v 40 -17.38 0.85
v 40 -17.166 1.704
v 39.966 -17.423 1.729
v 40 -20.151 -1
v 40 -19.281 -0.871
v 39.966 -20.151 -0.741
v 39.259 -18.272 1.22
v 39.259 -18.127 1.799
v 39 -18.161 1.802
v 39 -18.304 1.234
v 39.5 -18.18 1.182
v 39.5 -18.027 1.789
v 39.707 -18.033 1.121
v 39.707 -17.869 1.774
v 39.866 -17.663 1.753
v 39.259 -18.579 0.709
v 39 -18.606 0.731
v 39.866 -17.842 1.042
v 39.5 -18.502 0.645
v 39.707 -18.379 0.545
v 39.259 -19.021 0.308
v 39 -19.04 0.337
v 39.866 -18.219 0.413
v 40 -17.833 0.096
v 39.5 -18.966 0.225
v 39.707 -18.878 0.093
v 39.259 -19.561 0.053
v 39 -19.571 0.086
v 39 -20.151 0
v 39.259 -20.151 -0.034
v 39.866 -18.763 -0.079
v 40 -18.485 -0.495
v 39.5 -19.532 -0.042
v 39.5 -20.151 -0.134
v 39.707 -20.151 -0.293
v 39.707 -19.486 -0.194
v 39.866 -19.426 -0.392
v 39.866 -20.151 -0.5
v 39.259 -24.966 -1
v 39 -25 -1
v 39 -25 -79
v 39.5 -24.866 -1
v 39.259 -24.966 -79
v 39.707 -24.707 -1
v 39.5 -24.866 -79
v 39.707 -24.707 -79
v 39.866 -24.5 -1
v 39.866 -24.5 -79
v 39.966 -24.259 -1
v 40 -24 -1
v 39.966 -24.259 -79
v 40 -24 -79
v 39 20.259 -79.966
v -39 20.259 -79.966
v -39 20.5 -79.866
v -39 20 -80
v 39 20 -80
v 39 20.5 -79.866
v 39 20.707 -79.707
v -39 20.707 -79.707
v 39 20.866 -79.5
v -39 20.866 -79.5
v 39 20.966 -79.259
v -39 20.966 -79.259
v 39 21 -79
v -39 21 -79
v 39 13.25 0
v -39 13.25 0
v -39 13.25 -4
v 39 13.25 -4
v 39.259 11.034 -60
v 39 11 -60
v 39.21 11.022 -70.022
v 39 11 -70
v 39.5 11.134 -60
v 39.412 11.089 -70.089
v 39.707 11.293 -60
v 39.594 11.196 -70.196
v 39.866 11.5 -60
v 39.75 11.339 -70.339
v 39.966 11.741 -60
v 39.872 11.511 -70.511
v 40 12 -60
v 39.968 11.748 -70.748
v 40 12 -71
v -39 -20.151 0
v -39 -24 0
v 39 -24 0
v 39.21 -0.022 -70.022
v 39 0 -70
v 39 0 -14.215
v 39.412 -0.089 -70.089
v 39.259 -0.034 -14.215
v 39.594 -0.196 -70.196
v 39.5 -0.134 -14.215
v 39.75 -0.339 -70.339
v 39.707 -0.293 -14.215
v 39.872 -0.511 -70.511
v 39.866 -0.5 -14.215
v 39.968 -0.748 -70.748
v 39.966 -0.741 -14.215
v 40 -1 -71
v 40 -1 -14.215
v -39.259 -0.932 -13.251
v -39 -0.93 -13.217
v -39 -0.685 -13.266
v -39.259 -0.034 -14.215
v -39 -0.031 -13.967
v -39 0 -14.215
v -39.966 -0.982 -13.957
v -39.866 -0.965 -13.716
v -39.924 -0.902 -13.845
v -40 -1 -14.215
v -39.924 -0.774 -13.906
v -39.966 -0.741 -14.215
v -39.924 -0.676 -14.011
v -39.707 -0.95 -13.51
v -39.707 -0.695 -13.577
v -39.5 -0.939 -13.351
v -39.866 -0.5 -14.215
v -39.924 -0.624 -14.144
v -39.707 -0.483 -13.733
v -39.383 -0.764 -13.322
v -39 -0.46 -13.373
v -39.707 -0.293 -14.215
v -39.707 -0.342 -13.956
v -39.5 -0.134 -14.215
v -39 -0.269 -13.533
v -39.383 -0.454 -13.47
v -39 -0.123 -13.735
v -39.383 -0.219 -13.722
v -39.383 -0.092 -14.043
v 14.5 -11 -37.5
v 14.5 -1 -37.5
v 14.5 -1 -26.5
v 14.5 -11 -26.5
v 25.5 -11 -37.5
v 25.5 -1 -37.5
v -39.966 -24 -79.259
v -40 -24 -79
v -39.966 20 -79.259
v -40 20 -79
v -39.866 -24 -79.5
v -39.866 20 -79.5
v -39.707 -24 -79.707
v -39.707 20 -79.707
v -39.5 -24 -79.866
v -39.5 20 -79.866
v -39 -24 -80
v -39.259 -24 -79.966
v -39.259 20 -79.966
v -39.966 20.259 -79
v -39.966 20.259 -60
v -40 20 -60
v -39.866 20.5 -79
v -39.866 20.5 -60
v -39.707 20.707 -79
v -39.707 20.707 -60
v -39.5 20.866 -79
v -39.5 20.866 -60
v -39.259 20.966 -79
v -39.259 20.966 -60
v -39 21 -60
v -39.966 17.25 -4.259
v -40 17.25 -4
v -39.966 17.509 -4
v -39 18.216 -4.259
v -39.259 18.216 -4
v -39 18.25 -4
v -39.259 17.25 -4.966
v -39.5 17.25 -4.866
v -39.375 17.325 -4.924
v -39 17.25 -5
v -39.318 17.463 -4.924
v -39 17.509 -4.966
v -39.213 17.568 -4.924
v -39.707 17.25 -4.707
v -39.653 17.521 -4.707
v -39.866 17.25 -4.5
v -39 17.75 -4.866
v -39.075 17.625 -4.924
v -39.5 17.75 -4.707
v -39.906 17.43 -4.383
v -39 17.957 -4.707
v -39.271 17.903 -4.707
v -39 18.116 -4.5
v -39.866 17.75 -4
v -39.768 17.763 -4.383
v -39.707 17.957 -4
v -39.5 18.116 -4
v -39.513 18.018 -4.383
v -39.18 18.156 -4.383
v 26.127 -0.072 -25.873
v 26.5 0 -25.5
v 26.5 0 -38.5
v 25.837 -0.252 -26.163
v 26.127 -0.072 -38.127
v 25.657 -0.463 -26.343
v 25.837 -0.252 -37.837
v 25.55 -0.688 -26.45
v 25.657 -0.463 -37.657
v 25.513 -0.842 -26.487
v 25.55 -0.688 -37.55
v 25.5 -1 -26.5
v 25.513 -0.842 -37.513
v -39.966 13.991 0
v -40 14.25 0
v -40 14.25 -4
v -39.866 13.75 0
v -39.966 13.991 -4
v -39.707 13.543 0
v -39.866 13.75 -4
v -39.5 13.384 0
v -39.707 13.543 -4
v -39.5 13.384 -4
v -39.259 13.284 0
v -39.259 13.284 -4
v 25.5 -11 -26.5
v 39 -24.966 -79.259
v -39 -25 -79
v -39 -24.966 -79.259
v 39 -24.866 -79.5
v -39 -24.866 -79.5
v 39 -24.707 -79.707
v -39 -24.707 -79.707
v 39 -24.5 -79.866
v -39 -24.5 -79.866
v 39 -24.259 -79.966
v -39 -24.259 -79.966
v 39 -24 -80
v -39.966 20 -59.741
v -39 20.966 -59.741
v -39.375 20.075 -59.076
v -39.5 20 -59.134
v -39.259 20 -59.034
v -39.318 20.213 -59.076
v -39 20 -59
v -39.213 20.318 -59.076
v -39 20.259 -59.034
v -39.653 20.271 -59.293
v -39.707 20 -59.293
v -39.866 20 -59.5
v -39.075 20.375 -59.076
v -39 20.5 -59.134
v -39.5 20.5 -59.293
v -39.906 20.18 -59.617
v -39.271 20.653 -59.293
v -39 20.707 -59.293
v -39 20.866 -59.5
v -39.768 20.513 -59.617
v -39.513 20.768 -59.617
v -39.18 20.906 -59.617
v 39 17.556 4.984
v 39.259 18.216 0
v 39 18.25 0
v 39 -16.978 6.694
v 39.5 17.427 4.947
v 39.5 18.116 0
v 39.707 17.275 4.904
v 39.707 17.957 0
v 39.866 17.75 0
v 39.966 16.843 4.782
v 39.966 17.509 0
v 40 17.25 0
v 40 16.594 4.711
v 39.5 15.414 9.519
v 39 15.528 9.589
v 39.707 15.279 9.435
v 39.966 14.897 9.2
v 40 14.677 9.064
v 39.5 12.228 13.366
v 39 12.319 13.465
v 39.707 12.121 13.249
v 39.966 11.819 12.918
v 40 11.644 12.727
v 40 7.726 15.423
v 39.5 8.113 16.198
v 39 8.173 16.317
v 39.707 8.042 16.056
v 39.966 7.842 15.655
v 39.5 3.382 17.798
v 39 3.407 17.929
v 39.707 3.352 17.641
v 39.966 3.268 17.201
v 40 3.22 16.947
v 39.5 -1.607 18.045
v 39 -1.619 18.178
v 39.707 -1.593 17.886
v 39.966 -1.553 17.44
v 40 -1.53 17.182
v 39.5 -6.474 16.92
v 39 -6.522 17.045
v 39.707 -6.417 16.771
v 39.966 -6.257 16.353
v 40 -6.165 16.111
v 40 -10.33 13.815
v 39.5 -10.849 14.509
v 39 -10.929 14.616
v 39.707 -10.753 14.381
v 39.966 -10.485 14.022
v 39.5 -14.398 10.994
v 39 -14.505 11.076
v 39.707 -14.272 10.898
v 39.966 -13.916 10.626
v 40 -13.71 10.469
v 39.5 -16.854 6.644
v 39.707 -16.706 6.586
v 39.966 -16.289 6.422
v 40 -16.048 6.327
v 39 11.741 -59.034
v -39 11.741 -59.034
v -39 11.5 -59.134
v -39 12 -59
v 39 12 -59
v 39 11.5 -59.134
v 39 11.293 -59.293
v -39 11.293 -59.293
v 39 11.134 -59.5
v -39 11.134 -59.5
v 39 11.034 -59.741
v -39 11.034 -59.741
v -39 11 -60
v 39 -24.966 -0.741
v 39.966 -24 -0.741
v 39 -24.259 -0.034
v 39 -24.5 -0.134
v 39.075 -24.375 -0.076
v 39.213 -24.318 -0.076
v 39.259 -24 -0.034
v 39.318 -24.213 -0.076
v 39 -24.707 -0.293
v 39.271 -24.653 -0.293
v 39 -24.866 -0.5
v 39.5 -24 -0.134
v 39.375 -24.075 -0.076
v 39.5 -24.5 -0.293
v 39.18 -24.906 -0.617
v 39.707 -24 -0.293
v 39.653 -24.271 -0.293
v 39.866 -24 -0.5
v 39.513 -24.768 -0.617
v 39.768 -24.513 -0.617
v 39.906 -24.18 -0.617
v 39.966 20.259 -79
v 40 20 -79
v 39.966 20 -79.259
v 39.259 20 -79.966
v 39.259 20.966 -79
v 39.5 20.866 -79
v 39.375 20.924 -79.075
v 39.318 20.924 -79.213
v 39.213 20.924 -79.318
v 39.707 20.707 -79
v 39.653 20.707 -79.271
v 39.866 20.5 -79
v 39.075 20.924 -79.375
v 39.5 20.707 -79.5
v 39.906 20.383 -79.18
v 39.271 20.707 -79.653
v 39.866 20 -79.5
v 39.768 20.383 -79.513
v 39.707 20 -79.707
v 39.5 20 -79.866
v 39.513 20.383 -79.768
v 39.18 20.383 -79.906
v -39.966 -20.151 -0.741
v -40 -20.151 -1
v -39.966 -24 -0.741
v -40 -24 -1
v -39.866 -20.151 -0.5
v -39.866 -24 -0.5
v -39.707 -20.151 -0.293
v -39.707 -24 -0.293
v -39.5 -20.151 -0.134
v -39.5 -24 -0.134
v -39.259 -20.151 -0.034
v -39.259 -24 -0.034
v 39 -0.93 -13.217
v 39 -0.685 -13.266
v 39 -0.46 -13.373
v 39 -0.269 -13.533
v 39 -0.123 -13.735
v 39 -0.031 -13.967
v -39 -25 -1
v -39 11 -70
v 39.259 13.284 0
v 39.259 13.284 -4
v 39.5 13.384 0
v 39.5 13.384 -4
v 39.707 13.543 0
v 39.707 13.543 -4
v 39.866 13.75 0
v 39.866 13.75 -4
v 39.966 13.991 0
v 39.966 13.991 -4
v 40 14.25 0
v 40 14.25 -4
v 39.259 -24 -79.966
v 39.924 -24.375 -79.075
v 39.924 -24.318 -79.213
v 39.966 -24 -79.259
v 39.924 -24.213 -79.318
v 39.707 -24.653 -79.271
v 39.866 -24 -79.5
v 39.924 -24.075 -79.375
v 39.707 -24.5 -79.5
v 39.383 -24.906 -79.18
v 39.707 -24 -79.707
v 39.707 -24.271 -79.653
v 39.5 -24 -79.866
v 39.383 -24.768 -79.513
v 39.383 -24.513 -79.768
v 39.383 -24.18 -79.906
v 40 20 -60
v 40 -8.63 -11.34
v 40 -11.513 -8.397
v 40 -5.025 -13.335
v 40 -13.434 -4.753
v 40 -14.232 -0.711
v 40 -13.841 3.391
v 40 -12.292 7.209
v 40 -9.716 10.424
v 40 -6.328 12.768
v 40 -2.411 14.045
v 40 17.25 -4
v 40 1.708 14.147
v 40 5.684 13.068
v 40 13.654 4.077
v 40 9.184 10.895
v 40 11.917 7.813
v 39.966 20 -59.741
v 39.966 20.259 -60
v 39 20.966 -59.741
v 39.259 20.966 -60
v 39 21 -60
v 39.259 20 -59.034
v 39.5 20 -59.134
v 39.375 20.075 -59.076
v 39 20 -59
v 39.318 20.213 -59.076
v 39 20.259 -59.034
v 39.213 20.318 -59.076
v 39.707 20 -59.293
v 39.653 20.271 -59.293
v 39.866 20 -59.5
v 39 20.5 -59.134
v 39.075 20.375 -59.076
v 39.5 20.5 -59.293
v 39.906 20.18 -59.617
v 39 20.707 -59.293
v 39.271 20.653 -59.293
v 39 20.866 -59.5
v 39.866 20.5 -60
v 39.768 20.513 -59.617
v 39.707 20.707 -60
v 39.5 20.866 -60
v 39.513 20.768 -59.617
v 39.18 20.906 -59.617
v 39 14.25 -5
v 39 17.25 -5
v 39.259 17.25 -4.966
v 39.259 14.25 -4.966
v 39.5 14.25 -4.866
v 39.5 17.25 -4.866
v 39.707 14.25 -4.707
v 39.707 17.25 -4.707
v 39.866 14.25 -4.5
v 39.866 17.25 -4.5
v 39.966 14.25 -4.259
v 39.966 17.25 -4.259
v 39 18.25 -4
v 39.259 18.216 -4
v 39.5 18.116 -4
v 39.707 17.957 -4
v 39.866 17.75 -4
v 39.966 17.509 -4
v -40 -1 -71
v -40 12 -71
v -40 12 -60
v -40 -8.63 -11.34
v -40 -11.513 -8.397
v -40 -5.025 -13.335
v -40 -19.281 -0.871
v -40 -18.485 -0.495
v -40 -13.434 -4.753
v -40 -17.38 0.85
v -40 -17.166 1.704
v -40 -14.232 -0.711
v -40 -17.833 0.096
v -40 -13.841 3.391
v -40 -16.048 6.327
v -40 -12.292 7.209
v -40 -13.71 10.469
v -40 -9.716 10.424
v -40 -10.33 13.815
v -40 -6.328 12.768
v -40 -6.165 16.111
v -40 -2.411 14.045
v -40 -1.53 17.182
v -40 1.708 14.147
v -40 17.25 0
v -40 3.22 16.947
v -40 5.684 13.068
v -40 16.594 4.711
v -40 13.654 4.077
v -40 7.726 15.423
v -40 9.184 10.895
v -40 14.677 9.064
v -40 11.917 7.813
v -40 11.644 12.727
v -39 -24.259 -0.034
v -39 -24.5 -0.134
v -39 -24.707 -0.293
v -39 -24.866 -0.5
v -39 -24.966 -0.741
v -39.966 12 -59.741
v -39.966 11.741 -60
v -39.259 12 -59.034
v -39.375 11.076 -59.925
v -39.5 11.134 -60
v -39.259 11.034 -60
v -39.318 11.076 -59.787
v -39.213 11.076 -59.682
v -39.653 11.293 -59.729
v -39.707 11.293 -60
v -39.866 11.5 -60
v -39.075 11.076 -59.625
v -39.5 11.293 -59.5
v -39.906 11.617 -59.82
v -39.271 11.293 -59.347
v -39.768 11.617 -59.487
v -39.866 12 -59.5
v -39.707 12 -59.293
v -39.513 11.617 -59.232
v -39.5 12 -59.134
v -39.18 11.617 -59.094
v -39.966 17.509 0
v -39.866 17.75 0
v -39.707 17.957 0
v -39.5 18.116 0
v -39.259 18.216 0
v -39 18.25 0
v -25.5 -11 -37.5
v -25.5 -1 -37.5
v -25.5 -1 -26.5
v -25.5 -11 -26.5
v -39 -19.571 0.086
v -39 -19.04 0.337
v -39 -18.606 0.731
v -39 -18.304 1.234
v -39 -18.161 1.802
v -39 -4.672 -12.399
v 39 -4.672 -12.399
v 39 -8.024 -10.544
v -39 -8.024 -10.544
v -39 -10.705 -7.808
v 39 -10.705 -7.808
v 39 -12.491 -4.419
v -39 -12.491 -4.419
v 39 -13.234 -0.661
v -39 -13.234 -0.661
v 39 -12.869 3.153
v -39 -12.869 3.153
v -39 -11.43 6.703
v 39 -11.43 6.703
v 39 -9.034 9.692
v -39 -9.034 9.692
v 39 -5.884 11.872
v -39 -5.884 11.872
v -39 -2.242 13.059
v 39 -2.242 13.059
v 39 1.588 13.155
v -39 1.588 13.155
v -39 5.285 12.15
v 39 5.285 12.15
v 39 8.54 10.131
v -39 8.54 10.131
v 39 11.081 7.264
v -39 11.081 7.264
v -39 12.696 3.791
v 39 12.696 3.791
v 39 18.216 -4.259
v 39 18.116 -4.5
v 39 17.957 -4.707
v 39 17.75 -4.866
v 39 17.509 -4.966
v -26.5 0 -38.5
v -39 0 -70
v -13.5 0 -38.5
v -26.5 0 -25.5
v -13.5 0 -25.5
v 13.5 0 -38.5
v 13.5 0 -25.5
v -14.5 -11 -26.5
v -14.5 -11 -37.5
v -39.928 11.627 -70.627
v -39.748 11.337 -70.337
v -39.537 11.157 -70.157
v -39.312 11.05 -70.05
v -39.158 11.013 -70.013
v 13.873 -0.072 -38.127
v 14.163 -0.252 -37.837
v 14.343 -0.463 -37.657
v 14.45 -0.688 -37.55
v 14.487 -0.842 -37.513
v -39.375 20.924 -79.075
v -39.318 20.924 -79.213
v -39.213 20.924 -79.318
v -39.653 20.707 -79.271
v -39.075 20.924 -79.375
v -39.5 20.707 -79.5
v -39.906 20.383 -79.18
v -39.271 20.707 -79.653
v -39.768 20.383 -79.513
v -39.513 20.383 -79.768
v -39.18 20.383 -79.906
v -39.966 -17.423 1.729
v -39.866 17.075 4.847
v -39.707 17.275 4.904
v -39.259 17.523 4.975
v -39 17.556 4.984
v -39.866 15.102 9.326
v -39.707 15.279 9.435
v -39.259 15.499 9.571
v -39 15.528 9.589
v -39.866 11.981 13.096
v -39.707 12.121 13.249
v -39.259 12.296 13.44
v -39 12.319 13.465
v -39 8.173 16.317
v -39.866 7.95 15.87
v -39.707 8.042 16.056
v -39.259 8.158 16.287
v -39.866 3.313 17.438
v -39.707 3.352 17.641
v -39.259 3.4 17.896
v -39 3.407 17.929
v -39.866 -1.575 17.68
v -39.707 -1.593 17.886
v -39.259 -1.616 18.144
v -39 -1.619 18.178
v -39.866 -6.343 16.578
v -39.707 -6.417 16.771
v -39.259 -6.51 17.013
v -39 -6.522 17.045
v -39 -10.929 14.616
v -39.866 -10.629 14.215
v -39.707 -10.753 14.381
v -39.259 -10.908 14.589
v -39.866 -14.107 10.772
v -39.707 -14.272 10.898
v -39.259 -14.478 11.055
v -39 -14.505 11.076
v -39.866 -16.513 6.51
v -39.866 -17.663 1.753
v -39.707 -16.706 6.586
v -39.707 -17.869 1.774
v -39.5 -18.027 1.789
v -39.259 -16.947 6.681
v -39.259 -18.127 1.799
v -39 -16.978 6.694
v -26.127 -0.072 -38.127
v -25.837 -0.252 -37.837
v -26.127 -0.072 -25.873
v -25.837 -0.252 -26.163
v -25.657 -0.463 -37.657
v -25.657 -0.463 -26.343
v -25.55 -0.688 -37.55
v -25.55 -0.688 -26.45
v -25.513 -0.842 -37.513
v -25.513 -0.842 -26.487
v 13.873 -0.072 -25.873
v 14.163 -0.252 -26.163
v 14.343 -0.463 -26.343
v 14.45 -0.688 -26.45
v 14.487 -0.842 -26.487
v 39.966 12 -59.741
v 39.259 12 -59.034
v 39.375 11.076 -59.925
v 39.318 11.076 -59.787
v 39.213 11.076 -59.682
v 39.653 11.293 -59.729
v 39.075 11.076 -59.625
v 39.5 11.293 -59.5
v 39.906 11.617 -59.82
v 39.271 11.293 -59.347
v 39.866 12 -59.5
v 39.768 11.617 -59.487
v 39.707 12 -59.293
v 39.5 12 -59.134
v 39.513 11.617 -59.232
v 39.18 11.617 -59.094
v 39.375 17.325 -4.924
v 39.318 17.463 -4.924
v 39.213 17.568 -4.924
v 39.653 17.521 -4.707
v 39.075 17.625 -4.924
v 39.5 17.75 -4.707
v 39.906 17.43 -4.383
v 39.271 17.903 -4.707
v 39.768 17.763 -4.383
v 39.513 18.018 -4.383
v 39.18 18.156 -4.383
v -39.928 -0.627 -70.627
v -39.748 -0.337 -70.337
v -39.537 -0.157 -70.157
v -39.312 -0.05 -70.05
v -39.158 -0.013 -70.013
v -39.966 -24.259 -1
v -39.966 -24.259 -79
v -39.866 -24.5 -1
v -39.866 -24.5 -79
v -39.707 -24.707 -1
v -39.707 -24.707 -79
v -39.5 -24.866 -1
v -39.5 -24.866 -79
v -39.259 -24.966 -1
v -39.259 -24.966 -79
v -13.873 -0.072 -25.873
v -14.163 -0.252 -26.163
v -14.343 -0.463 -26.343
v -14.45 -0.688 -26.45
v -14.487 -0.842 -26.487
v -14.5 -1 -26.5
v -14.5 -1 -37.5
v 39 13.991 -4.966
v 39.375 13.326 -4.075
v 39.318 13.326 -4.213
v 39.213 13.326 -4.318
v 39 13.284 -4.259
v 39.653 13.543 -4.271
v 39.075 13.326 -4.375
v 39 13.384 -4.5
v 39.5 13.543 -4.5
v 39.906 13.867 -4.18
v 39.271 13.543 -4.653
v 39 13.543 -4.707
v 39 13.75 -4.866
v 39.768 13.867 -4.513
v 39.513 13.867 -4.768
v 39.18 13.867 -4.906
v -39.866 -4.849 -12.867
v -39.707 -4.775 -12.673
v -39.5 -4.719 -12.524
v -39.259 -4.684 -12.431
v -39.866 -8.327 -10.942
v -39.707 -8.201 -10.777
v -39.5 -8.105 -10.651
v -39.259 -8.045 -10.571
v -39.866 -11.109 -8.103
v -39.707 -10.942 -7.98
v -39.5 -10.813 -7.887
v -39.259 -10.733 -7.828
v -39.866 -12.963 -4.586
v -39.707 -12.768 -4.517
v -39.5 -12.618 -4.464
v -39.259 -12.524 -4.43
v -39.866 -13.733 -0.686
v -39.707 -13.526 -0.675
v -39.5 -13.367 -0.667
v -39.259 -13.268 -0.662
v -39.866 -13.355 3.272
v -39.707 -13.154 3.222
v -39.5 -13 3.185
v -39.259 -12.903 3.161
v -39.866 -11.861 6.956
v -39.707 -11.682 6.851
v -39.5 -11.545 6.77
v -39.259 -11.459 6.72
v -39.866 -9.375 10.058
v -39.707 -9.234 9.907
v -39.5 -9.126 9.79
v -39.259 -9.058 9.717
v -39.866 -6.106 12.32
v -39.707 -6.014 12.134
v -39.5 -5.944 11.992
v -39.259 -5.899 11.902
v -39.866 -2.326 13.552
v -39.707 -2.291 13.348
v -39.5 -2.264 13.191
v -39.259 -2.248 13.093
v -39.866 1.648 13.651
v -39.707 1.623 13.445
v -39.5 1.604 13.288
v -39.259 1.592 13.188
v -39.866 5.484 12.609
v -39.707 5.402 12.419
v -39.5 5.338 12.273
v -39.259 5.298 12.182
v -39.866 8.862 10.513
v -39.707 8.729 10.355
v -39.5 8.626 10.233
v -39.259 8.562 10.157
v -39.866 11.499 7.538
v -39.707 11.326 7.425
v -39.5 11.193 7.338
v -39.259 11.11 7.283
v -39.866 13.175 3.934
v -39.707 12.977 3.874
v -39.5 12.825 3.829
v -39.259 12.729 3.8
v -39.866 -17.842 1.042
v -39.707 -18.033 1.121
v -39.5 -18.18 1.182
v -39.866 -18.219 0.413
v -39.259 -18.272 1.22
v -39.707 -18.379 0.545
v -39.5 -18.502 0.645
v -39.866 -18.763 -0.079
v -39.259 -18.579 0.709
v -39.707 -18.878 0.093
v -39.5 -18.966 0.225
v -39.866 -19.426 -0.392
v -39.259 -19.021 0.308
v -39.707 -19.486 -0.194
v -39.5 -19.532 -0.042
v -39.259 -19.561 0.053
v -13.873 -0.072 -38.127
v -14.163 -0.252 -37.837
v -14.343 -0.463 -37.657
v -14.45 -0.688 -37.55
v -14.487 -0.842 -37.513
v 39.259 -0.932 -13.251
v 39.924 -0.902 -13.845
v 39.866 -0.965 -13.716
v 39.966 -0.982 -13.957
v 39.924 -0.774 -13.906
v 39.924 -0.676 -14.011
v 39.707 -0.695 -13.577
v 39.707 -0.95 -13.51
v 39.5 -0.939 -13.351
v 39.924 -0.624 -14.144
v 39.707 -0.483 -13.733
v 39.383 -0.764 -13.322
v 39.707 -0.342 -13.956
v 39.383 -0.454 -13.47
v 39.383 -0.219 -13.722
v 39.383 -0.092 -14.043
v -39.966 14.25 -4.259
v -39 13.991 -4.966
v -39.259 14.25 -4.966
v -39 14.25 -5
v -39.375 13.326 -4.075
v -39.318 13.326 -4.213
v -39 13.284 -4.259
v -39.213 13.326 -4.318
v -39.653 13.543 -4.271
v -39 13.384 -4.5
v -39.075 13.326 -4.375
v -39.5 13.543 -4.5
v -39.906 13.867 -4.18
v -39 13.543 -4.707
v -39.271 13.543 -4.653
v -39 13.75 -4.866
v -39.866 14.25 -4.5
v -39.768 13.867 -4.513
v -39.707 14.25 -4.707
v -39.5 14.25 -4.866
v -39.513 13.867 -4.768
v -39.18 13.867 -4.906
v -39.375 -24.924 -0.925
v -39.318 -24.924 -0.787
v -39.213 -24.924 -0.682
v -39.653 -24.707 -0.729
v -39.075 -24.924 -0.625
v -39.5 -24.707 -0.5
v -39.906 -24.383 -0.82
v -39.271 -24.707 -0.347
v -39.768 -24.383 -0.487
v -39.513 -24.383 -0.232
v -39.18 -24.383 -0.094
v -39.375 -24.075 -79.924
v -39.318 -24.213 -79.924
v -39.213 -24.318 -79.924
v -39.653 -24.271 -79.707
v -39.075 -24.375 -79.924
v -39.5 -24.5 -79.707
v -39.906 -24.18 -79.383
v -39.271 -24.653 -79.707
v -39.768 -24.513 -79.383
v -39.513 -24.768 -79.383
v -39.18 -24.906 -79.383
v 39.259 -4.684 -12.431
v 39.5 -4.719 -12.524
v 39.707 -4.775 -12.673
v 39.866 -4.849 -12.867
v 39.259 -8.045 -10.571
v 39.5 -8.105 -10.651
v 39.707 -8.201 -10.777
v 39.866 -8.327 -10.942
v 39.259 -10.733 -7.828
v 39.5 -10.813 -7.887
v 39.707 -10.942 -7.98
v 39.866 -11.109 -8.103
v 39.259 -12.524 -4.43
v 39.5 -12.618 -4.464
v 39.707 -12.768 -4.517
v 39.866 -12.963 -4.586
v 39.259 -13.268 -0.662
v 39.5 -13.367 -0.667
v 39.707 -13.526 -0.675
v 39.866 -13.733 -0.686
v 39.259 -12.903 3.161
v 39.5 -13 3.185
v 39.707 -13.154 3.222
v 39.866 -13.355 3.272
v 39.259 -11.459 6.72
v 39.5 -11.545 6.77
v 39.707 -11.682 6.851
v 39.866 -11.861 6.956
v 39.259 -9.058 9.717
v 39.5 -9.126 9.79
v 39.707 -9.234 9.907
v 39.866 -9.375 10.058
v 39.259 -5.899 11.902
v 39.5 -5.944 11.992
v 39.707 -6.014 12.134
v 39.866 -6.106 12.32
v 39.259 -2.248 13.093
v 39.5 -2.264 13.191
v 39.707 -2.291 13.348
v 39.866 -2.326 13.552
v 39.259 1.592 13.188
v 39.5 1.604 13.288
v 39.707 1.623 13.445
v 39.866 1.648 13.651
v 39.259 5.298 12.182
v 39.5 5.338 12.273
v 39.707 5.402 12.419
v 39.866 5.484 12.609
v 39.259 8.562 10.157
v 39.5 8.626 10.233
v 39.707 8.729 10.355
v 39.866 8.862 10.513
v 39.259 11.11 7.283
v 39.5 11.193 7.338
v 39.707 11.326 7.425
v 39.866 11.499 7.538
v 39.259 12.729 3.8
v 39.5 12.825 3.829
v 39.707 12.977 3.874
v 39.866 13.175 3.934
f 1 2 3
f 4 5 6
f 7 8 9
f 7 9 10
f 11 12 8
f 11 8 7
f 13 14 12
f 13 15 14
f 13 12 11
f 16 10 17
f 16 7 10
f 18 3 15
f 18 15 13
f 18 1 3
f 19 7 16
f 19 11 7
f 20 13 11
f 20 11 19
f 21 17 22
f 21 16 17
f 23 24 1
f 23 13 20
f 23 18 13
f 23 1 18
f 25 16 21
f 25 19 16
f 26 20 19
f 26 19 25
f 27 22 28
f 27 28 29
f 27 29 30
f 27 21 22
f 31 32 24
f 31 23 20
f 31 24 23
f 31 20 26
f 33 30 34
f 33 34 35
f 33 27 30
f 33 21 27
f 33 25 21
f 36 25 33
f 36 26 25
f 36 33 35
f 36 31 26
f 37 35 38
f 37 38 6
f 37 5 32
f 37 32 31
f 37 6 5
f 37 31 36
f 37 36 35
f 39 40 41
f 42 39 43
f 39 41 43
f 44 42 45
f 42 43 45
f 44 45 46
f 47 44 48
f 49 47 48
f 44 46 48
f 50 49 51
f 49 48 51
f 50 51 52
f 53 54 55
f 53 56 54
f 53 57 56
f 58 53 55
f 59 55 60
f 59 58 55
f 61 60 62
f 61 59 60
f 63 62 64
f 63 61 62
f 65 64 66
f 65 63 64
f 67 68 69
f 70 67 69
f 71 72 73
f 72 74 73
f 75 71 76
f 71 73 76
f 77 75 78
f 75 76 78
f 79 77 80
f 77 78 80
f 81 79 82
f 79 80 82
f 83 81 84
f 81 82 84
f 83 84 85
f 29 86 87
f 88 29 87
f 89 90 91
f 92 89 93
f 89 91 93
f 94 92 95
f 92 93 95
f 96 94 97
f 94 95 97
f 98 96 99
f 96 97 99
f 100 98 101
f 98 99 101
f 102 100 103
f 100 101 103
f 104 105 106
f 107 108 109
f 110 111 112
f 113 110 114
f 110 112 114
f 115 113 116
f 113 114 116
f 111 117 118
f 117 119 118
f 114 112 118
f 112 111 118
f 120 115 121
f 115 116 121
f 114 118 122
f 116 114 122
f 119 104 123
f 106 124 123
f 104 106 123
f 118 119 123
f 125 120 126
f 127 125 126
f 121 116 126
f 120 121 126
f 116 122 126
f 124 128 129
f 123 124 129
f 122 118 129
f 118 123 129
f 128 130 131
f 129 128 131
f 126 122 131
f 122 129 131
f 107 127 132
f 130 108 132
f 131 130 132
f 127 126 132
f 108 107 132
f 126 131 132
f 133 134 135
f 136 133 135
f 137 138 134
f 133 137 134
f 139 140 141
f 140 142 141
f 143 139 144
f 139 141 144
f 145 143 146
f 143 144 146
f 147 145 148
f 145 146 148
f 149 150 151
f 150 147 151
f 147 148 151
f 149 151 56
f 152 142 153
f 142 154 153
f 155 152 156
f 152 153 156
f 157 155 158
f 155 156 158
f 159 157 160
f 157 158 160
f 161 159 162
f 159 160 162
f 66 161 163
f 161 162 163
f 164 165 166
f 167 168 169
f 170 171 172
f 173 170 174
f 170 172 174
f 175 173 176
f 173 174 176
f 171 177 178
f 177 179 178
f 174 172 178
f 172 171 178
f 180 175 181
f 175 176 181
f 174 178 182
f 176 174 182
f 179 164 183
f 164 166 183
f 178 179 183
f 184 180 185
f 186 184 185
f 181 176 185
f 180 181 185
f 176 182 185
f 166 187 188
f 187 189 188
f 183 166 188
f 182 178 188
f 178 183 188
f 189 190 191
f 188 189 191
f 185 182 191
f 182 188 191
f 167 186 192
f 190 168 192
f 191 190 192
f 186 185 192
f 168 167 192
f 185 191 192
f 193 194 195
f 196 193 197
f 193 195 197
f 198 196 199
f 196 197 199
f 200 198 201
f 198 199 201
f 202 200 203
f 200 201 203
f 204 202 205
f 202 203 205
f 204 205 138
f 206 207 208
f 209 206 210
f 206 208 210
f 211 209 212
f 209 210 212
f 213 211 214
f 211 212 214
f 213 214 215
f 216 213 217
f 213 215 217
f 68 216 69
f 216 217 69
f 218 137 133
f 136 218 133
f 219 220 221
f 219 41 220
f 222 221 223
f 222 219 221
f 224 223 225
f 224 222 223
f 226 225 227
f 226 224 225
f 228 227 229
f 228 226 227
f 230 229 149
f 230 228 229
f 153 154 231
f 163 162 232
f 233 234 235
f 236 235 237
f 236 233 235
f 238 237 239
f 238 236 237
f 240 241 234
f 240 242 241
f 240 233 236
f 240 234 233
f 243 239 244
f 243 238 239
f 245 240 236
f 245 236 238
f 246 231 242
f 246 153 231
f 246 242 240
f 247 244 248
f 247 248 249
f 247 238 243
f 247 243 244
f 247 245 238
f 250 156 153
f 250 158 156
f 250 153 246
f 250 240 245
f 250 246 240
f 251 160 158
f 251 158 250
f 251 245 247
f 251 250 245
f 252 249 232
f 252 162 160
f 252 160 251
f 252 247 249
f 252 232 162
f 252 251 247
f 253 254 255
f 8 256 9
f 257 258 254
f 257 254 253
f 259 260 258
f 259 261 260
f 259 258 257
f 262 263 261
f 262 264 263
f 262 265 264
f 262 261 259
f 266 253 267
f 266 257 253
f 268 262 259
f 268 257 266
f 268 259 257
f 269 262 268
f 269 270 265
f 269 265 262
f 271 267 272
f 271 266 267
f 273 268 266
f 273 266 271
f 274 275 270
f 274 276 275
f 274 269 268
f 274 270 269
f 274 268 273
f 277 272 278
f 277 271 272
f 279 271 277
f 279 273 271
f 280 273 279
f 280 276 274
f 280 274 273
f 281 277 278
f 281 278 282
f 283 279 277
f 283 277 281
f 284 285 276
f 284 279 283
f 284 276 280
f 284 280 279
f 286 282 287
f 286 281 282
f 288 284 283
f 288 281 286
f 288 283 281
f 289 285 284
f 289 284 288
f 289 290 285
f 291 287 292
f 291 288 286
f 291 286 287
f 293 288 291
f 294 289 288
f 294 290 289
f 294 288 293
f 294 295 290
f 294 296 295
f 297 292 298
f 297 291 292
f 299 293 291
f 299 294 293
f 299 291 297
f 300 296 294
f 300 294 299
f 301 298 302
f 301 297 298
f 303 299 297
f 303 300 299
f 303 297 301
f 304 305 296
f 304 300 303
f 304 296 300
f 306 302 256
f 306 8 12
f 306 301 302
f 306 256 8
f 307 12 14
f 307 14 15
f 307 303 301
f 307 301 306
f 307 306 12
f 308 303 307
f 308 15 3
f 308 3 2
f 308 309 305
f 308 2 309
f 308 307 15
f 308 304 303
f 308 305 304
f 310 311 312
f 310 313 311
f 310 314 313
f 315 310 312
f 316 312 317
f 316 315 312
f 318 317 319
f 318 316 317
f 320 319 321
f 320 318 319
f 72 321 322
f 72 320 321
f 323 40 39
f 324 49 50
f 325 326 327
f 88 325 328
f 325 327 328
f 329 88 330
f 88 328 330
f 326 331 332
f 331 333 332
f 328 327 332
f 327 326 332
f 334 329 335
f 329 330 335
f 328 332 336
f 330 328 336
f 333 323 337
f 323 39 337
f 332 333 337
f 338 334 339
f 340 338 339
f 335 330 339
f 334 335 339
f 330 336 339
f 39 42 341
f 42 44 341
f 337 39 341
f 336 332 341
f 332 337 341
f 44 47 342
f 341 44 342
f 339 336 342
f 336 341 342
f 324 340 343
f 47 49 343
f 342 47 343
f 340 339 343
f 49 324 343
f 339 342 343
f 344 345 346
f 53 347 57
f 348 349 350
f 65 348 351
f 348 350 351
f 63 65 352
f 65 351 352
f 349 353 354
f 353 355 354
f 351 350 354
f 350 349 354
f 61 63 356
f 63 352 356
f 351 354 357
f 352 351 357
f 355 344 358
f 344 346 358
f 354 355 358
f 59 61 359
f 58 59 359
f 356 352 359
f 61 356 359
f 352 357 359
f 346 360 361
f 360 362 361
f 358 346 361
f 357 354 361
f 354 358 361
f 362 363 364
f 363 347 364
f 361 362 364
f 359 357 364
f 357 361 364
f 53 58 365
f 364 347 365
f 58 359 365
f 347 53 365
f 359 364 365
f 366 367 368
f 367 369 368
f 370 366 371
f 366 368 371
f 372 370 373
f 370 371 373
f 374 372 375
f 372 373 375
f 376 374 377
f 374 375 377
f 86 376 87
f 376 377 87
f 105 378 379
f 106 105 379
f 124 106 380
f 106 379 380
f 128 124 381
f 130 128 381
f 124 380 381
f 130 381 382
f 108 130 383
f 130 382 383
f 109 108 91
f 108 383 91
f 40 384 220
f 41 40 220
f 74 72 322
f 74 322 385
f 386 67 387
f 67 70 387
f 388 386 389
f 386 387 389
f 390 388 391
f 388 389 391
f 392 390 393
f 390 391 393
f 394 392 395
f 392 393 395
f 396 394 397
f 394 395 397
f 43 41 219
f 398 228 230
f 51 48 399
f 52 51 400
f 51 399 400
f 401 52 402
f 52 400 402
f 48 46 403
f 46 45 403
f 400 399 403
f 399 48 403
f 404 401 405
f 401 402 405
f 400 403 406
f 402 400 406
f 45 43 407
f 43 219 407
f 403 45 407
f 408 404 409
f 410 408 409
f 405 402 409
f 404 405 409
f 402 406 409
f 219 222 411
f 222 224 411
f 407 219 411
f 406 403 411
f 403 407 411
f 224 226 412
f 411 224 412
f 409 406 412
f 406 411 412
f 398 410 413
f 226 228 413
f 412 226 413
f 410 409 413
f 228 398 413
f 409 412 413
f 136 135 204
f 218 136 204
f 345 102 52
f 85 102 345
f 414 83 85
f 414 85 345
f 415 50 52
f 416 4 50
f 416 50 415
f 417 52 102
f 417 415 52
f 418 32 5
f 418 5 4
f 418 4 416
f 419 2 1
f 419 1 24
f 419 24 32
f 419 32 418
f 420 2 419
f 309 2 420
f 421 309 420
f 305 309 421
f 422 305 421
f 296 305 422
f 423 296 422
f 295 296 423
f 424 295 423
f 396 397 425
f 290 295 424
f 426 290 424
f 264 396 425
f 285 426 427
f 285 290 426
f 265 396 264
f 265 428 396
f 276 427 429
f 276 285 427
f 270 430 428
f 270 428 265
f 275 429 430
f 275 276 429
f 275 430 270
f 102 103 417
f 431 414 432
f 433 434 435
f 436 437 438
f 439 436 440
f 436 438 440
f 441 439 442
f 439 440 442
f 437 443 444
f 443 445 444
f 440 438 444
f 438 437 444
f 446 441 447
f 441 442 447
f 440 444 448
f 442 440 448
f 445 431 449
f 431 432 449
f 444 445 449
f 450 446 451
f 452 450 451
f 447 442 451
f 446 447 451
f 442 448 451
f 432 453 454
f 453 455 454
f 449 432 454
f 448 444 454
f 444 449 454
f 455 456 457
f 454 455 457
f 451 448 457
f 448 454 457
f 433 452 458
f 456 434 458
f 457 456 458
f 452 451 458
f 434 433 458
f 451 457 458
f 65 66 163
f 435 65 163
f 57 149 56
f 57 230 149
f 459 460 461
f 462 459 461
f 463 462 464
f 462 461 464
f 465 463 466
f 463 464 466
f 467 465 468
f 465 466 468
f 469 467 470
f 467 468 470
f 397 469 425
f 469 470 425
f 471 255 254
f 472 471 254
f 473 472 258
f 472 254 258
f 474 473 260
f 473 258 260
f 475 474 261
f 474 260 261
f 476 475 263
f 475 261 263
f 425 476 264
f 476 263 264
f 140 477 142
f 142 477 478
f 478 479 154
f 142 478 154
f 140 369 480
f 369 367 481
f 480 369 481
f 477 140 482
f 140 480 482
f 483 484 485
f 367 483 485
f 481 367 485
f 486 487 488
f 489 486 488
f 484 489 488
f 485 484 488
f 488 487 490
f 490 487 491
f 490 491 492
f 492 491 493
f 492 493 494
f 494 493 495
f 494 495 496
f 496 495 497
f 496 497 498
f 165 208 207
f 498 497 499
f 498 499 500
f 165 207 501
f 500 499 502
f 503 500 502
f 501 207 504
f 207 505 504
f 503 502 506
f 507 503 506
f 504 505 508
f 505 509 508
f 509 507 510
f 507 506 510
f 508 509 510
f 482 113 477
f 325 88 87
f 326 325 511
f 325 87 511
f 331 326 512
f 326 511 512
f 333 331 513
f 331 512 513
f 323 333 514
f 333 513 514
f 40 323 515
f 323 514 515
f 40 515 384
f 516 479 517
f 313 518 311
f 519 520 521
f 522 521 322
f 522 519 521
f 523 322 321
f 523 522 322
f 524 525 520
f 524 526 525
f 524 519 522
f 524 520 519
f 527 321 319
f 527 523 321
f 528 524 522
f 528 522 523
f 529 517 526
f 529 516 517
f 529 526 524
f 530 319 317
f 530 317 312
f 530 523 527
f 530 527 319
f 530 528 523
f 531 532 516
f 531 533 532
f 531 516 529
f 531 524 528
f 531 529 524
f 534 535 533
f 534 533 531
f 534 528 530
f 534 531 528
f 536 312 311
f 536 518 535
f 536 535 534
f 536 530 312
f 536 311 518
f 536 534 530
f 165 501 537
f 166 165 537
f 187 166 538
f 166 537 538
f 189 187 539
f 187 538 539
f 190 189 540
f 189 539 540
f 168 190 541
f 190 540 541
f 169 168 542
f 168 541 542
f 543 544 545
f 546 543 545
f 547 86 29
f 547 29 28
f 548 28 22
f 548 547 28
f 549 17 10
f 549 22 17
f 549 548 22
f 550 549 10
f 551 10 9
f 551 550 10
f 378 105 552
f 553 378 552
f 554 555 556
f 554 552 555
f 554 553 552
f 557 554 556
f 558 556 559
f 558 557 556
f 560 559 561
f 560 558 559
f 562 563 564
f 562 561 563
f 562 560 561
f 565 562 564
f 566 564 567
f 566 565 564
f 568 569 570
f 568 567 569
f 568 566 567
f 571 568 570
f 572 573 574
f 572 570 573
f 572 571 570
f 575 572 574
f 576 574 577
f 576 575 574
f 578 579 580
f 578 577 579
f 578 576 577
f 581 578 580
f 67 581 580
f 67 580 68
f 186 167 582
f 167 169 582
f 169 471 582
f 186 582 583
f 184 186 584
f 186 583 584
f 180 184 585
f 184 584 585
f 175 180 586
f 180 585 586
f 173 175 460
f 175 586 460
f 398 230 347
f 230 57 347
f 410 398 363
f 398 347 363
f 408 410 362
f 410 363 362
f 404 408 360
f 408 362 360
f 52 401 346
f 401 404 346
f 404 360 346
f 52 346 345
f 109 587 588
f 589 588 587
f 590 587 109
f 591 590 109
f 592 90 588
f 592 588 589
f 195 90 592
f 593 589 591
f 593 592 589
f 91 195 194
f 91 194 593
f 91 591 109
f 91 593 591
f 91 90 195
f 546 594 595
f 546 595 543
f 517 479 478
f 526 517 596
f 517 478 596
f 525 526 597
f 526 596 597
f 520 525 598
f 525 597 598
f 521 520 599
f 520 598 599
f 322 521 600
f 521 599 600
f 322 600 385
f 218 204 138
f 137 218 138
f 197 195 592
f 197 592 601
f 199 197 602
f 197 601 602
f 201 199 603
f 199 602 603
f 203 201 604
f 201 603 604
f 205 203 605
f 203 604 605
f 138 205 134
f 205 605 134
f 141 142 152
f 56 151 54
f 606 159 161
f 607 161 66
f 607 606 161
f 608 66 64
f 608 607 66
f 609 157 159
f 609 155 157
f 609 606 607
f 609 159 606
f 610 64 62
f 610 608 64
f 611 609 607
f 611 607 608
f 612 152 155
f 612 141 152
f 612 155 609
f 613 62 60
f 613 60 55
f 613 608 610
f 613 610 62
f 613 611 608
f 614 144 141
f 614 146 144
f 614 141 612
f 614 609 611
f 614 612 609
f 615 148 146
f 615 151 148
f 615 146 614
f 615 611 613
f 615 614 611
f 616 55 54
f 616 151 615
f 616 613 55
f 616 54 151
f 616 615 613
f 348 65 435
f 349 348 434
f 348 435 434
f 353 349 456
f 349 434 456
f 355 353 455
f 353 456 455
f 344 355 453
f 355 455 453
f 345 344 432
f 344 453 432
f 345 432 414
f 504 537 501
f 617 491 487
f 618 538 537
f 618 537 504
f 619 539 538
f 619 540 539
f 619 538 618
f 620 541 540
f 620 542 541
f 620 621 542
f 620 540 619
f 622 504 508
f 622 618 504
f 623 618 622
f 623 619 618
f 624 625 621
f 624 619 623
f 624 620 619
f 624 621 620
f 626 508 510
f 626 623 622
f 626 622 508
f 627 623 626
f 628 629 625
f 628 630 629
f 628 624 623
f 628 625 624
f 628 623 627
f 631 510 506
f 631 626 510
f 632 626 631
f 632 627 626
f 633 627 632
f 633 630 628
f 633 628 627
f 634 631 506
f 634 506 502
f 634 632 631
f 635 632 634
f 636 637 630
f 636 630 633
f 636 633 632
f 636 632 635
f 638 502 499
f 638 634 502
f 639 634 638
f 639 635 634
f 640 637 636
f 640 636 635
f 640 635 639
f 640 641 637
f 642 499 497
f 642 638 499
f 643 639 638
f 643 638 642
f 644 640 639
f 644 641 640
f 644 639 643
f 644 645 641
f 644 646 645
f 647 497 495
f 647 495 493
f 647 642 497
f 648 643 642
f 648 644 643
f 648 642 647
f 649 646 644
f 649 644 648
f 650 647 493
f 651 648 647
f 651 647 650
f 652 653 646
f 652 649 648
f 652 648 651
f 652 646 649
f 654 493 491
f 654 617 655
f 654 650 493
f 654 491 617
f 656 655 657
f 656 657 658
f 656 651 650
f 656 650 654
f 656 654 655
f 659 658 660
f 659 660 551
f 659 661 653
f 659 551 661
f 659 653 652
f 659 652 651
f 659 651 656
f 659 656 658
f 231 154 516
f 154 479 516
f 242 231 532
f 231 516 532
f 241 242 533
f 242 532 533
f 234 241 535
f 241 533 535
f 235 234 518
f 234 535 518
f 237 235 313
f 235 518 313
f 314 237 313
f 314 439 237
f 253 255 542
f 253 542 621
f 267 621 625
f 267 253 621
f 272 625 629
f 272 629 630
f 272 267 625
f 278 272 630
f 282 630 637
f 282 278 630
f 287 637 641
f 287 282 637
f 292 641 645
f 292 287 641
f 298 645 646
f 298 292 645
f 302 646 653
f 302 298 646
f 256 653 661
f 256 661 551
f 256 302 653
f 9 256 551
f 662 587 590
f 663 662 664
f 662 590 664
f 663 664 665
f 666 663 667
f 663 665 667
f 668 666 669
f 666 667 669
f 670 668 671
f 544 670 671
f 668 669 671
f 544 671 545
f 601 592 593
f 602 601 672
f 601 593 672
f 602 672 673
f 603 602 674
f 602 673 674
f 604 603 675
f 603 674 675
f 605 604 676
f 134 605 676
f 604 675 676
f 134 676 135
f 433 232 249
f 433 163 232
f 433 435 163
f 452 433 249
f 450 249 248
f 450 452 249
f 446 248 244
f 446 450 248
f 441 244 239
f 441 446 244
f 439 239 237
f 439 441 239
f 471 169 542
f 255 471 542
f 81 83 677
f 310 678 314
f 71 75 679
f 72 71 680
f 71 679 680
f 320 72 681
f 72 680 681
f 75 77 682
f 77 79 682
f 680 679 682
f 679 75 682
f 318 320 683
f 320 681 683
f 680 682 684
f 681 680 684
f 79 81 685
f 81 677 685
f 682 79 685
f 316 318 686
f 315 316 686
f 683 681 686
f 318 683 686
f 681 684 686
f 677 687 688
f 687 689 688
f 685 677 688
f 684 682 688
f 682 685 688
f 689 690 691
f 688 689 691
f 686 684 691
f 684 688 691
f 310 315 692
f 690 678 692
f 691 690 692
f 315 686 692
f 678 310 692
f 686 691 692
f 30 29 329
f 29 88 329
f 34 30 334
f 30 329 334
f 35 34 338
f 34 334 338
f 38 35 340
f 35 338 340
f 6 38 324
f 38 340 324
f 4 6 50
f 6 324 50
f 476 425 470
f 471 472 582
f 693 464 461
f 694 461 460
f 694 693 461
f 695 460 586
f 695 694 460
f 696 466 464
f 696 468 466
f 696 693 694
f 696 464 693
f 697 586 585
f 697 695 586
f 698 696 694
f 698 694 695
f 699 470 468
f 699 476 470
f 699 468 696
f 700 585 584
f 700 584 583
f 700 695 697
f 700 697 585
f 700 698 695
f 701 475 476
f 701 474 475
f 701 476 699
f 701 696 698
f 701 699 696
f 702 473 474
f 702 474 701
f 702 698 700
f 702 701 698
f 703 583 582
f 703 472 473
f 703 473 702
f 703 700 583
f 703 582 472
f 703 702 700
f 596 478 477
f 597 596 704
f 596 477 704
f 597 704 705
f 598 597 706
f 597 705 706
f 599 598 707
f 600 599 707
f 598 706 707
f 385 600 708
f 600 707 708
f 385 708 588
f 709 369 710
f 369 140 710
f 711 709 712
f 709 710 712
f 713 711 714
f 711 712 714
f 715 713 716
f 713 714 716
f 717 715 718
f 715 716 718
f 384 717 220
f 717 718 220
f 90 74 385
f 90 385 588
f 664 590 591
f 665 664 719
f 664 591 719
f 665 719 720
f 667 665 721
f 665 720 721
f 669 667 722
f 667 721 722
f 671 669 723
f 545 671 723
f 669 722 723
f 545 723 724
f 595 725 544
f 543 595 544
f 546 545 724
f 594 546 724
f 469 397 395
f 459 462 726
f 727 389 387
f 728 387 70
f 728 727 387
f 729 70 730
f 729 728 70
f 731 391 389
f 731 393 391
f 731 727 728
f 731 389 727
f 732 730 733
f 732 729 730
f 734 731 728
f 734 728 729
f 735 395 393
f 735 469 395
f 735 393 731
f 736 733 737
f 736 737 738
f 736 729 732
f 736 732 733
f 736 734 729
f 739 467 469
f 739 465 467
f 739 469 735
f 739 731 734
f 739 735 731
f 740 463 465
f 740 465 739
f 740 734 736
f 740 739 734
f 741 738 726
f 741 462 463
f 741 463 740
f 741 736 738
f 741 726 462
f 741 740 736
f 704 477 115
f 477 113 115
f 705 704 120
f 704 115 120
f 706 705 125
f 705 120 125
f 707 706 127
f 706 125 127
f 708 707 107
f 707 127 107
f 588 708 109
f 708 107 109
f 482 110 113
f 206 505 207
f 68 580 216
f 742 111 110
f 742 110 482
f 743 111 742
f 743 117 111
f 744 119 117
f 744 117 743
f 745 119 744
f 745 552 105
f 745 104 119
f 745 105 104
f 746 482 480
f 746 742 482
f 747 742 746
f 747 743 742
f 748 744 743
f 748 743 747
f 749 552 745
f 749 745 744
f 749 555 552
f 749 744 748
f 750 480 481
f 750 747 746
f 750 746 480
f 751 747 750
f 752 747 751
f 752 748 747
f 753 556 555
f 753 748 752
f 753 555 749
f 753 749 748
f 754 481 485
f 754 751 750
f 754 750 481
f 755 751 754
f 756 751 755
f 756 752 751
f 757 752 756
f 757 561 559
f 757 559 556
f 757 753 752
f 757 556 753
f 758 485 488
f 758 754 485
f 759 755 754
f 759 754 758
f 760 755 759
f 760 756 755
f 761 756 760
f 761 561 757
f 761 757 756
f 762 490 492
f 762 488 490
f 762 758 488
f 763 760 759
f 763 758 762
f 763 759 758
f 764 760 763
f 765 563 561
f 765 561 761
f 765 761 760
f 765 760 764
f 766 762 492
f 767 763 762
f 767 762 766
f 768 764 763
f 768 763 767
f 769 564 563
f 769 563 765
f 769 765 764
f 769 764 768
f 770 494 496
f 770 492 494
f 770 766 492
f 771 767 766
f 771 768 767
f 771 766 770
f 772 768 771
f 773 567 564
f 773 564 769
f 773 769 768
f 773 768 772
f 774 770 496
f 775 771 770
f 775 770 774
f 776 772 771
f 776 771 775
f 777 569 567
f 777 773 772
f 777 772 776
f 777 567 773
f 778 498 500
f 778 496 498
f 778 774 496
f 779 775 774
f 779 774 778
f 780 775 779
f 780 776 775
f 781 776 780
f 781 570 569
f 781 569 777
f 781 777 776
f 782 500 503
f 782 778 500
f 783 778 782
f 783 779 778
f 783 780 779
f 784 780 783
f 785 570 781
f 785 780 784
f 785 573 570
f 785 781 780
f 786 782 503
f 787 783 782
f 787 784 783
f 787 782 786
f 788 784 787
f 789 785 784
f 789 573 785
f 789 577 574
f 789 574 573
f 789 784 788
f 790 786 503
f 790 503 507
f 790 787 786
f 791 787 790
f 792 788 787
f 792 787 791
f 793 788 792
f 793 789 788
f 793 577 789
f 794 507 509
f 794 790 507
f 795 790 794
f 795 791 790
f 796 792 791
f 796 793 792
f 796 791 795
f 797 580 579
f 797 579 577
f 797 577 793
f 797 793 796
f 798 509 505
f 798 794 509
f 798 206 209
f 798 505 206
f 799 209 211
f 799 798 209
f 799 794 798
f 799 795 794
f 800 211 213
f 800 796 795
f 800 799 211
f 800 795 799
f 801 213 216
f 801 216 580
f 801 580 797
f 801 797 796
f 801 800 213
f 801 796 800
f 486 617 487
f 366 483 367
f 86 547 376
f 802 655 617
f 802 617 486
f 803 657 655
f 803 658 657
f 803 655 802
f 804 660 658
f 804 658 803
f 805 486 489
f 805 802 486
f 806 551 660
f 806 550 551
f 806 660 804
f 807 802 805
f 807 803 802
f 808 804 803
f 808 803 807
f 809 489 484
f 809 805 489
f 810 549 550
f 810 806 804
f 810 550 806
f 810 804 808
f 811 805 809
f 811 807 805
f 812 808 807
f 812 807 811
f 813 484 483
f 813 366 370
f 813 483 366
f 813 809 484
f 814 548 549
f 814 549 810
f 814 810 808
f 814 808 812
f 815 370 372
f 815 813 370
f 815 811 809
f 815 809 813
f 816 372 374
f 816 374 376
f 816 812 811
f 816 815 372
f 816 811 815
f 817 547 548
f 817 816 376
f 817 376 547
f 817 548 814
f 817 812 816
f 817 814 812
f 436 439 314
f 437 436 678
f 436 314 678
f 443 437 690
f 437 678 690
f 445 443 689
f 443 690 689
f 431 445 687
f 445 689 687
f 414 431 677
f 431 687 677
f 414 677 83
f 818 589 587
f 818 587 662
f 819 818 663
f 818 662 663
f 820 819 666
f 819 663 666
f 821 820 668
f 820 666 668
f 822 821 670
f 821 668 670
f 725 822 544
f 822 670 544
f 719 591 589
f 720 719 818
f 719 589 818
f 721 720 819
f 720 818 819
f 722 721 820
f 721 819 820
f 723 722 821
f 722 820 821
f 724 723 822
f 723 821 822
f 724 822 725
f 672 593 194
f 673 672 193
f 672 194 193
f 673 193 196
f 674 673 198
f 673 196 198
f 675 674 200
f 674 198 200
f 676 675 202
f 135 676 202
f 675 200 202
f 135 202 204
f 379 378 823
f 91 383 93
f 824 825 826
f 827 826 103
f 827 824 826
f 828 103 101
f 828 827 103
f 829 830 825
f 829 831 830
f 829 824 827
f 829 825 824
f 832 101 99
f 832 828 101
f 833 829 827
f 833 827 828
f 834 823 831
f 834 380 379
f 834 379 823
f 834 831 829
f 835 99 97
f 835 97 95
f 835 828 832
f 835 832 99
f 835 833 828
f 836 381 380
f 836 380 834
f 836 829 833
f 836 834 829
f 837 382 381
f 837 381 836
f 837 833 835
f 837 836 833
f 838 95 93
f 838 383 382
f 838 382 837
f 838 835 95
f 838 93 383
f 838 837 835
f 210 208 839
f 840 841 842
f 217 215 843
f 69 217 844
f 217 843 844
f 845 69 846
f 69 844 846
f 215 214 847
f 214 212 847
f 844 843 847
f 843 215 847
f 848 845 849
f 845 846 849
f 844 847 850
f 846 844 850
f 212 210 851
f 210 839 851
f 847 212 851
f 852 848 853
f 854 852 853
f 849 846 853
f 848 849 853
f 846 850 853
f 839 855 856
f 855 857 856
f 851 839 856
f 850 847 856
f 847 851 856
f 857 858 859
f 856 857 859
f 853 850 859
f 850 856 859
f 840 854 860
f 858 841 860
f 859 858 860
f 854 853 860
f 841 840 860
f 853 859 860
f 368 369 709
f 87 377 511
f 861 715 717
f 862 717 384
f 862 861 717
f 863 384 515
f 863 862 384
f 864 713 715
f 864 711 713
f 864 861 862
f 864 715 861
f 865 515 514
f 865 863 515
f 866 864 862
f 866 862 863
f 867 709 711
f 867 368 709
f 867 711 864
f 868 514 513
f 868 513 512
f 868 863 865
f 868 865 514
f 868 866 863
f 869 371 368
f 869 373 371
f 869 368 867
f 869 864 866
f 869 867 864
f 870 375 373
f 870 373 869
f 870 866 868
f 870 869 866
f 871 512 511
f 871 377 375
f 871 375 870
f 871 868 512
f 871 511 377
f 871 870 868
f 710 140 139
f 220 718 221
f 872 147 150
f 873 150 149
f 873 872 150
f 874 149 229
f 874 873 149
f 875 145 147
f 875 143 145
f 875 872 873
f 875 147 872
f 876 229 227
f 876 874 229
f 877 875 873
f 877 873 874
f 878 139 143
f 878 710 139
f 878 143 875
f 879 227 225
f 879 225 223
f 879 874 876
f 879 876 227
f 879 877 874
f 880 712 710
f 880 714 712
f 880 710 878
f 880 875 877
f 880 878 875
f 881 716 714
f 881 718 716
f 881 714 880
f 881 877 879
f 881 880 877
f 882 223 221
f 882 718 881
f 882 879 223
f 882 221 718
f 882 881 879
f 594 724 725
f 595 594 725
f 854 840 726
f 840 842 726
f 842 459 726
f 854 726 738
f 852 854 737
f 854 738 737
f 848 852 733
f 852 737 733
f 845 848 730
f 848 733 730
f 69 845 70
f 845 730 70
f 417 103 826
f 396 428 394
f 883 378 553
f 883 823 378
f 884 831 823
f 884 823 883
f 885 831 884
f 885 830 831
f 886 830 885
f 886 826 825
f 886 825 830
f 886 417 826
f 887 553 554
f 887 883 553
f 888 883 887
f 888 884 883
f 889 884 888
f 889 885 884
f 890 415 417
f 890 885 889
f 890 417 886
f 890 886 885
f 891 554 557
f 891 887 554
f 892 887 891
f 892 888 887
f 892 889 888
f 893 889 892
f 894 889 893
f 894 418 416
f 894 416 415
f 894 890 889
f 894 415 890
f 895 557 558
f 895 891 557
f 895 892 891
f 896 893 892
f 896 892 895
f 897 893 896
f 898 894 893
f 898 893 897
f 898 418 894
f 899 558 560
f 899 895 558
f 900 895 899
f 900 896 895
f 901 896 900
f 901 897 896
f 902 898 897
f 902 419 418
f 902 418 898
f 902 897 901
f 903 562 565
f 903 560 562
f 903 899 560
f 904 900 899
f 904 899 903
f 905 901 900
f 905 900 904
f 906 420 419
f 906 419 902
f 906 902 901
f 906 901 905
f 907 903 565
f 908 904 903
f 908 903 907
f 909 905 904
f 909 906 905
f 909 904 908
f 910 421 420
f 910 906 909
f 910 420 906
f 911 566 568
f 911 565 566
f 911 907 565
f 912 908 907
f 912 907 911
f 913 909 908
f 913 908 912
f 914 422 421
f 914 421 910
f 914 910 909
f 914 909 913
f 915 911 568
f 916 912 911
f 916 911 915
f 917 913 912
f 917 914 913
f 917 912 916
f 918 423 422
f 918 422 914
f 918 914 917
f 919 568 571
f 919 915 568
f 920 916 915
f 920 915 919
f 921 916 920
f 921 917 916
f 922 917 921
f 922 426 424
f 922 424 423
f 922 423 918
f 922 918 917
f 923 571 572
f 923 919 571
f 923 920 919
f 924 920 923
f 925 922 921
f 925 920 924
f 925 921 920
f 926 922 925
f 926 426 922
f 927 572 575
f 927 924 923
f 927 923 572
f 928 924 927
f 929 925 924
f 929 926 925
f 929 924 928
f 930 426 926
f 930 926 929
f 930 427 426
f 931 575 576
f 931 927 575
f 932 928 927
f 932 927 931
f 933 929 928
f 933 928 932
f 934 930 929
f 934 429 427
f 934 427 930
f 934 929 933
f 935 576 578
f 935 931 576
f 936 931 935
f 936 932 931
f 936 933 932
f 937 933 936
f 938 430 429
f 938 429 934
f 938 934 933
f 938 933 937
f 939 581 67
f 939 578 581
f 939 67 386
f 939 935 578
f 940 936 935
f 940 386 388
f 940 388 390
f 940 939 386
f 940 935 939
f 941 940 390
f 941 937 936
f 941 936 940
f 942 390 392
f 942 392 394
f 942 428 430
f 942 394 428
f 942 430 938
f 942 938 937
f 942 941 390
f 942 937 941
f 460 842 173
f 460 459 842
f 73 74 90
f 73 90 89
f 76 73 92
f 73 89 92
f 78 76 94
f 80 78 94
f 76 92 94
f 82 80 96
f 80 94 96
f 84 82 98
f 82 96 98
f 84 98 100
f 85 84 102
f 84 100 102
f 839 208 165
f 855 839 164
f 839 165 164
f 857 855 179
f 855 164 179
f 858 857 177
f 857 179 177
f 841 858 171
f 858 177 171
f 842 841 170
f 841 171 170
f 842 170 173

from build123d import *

# Parameters (mm, degrees)
F1_DEPTH = 40
F2_W     = 5.5
F2_H     = 5.5
F3_DEPTH = 11
F4_R     = 2
F5_R     = 1


# Not quite as in the source:
# - a feature names something its author has since deleted; it is built from what else it names


with BuildPart() as f1:
    # F0 (on Right) → F1 (new body, symmetric)
    with BuildSketch(Plane.YZ):
        with BuildLine():
            ThreePointArc((0, -18.25), (-12.9046987567, -12.9046987567), (-18.25, 0))
            Line((-18.25, 0), (-25, 0))
            Line((-25, 0), (-25, -80))
            Line((-25, -80), (21, -80))
            Line((21, -80), (21, -59))
            Line((21, -59), (11, -59))
            Line((11, -59), (11, -70))
            Line((11, -70), (0, -70))
            Line((0, -70), (0, -18.25))
        make_face()
        with BuildLine():
            Line((-13.25, 0), (-18.25, 0))
            ThreePointArc((-18.25, 0), (-12.9046987567, -12.9046987567), (0, -18.25))
            Line((0, -18.25), (0, -13.25))
            ThreePointArc((0, -13.25), (-9.3691648507, -9.3691648507), (-13.25, 0))
        make_face()
        with BuildLine():
            ThreePointArc((17.5517093185, -5), (18.0745842976, -2.5242627575), (18.25, 0))
            Line((18.25, 0), (13.25, 0))
            Line((13.25, 0), (13.25, -5))
            Line((13.25, -5), (17.5517093185, -5))
        make_face()
        with BuildLine():
            Line((18.25, -5), (18.25, 0))
            ThreePointArc((18.25, 0), (18.0745842976, -2.5242627575), (17.5517093185, -5))
            Line((17.5517093185, -5), (18.25, -5))
        make_face()
        with BuildLine():
            Line((13.25, 0), (18.25, 0))
            ThreePointArc((18.25, 0), (0, 18.25), (-18.25, 0))
            Line((-18.25, 0), (-13.25, 0))
            ThreePointArc((-13.25, 0), (0, 13.25), (13.25, 0))
        make_face()
    extrude(amount=F1_DEPTH, both=True)

    # F2 (on face) → F3 (cut)
    with BuildSketch(Plane(origin=(0, 0, 0), x_dir=(-1, 0, 0), z_dir=(0, 1, 0))):
        with Locations((-17.25, -29.25)):
            Rectangle(F2_W, F2_H)
        with Locations((-22.75, -29.25)):
            Rectangle(F2_W, F2_H)
        Polygon((-14.5, -32), (-20, -32), (-25.5, -32), (-25.5, -37.5), (-20, -37.5), (-14.5, -37.5), align=None)
        Polygon((25.5, -26.5), (20, -26.5), (14.5, -26.5), (14.5, -32), (14.5, -37.5), (20, -37.5), (25.5, -37.5), (25.5, -32), align=None)
    extrude(amount=-F3_DEPTH, mode=Mode.SUBTRACT)

    # F4
    f4_edges = [f1.edges().sort_by_distance(p)[0] for p in [
        (0, -18.25, 0),
    ]]
    fillet(f4_edges, radius=F4_R)

    # F5
    f5_edges = [f1.edges().sort_by_distance(p)[0] for p in [
        (-40, 0.902338, 18.227679),
        (-40, -18.808432, 0.517593),
        (-40, 18.25, -2.5),
        (-40, -22.575496, 0),
        (-40, 15.75, -5),
        (-40, -25, -40),
        (-40, 13.25, -2.5),
        (-40, -2, -80),
        (-40, -9.369165, 9.369165),
        (-40, 21, -69.5),
        (-40, 0, -41.625),
        (-40, 16, -59),
        (-40, 5.5, -70),
        (-40, 11, -64.5),
        (0, -25, -80),
        (40, -25, -40),
        (0, -25, 0),
        (40, 0.902338, 18.227679),
        (40, -18.808432, 0.517593),
        (40, 18.25, -2.5),
        (40, -22.575496, 0),
        (40, 15.75, -5),
        (40, 13.25, -2.5),
        (40, -2, -80),
        (40, -9.369165, 9.369165),
        (40, 21, -69.5),
        (40, 0, -41.625),
        (40, 16, -59),
        (40, 5.5, -70),
        (40, 11, -64.5),
        (0, 21, -80),
        (0, 21, -59),
        (0, 11, -59),
        (0, 18.25, -5),
        (0, 13.25, -5),
        (0, 0, -13.25),
        (25.5, 0, -32),
        (20, 0, -26.5),
        (14.5, 0, -32),
        (20, 0, -37.5),
        (-14.5, 0, -32),
        (-20, 0, -26.5),
        (-25.5, 0, -32),
        (-20, 0, -37.5),
    ]]
    fillet(f5_edges, radius=F5_R)


solid = f1.part
